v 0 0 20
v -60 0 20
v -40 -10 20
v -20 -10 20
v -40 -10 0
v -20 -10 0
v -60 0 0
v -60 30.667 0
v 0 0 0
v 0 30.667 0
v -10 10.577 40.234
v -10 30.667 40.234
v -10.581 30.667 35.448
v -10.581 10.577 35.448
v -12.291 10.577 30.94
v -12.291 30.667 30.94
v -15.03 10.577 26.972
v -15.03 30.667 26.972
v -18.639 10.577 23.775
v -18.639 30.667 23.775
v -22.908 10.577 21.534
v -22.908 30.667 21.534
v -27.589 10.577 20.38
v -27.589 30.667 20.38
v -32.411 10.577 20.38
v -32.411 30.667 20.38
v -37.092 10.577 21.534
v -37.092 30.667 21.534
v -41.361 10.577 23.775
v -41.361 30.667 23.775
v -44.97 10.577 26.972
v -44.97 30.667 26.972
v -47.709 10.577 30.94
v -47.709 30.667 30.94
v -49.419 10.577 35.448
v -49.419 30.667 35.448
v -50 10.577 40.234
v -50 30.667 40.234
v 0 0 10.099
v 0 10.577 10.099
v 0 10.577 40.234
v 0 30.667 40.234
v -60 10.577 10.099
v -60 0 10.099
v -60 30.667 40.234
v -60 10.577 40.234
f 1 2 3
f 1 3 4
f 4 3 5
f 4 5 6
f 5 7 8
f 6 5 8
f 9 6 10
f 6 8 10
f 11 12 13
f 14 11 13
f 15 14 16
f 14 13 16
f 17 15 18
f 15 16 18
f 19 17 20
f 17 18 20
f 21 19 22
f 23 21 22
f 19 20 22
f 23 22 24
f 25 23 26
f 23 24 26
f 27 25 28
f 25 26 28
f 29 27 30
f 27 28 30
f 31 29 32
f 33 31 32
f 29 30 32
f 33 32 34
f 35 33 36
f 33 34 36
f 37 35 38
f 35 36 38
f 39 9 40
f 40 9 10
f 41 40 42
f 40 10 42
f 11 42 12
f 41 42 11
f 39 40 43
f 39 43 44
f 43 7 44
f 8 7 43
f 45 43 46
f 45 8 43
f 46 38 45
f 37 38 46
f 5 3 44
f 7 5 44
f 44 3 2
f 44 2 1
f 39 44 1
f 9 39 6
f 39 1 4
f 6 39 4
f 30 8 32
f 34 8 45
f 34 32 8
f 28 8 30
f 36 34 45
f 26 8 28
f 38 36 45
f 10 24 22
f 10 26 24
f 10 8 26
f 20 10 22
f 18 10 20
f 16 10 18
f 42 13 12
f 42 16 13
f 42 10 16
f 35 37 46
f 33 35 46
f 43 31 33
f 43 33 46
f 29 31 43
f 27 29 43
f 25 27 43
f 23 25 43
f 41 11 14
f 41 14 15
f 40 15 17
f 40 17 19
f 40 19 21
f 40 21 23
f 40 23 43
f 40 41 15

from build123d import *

# Parameters (mm, degrees)
F1_DEPTH = 60
F3_DEPTH = 30.66775
F4_W     = 60
F4_H     = 20
F5_DEPTH = 10
F7_DEPTH = 20.001


with BuildPart() as f1:
    # F0 (on Right) → F1 (new body)
    with BuildSketch(Plane.YZ):
        Polygon((0, 10.099097), (0, 0), (30.66675, 0), (30.66675, 40.234312), (10.576608, 40.234312), (10.576608, 10.099097), align=None)
    extrude(amount=-F1_DEPTH)

    # F2 (on face) → F3 (cut, through all)
    with BuildSketch(Plane(origin=(0, 30.66675, 0), x_dir=(-1, 0, 0), z_dir=(0, 1, 0))):
        with BuildLine():
            Line((50, 40.234312), (10, 40.234312))
            ThreePointArc((10, 40.234312), (30, 20.234312), (50, 40.234312))
        make_face()
    extrude(amount=-F3_DEPTH, mode=Mode.SUBTRACT)

    # F4 (on face) → F5 (join)
    with BuildSketch(Plane.XZ):
        with Locations((-30, 10)):
            Rectangle(F4_W, F4_H)
    extrude(amount=F5_DEPTH)

    # F6 (on face) → F7 (cut, through all)
    with BuildSketch(Plane.XY.offset(20)):
        Polygon((0, 0), (-20, -10), (0, -10), align=None)
        Polygon((-40, -10), (-60, 0), (-60, -10), align=None)
    extrude(amount=-F7_DEPTH, mode=Mode.SUBTRACT)


solid = f1.part
